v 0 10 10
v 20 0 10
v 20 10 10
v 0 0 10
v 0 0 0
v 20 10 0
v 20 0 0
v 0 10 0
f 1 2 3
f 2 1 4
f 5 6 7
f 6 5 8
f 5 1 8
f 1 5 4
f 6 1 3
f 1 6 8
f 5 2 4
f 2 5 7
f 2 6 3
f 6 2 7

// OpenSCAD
union() {
    cube([10,10,10]);
    translate([10, 0, 0]) {
        color("#ffffff") {
            cube([10,10,10]);
        }
    }
}
